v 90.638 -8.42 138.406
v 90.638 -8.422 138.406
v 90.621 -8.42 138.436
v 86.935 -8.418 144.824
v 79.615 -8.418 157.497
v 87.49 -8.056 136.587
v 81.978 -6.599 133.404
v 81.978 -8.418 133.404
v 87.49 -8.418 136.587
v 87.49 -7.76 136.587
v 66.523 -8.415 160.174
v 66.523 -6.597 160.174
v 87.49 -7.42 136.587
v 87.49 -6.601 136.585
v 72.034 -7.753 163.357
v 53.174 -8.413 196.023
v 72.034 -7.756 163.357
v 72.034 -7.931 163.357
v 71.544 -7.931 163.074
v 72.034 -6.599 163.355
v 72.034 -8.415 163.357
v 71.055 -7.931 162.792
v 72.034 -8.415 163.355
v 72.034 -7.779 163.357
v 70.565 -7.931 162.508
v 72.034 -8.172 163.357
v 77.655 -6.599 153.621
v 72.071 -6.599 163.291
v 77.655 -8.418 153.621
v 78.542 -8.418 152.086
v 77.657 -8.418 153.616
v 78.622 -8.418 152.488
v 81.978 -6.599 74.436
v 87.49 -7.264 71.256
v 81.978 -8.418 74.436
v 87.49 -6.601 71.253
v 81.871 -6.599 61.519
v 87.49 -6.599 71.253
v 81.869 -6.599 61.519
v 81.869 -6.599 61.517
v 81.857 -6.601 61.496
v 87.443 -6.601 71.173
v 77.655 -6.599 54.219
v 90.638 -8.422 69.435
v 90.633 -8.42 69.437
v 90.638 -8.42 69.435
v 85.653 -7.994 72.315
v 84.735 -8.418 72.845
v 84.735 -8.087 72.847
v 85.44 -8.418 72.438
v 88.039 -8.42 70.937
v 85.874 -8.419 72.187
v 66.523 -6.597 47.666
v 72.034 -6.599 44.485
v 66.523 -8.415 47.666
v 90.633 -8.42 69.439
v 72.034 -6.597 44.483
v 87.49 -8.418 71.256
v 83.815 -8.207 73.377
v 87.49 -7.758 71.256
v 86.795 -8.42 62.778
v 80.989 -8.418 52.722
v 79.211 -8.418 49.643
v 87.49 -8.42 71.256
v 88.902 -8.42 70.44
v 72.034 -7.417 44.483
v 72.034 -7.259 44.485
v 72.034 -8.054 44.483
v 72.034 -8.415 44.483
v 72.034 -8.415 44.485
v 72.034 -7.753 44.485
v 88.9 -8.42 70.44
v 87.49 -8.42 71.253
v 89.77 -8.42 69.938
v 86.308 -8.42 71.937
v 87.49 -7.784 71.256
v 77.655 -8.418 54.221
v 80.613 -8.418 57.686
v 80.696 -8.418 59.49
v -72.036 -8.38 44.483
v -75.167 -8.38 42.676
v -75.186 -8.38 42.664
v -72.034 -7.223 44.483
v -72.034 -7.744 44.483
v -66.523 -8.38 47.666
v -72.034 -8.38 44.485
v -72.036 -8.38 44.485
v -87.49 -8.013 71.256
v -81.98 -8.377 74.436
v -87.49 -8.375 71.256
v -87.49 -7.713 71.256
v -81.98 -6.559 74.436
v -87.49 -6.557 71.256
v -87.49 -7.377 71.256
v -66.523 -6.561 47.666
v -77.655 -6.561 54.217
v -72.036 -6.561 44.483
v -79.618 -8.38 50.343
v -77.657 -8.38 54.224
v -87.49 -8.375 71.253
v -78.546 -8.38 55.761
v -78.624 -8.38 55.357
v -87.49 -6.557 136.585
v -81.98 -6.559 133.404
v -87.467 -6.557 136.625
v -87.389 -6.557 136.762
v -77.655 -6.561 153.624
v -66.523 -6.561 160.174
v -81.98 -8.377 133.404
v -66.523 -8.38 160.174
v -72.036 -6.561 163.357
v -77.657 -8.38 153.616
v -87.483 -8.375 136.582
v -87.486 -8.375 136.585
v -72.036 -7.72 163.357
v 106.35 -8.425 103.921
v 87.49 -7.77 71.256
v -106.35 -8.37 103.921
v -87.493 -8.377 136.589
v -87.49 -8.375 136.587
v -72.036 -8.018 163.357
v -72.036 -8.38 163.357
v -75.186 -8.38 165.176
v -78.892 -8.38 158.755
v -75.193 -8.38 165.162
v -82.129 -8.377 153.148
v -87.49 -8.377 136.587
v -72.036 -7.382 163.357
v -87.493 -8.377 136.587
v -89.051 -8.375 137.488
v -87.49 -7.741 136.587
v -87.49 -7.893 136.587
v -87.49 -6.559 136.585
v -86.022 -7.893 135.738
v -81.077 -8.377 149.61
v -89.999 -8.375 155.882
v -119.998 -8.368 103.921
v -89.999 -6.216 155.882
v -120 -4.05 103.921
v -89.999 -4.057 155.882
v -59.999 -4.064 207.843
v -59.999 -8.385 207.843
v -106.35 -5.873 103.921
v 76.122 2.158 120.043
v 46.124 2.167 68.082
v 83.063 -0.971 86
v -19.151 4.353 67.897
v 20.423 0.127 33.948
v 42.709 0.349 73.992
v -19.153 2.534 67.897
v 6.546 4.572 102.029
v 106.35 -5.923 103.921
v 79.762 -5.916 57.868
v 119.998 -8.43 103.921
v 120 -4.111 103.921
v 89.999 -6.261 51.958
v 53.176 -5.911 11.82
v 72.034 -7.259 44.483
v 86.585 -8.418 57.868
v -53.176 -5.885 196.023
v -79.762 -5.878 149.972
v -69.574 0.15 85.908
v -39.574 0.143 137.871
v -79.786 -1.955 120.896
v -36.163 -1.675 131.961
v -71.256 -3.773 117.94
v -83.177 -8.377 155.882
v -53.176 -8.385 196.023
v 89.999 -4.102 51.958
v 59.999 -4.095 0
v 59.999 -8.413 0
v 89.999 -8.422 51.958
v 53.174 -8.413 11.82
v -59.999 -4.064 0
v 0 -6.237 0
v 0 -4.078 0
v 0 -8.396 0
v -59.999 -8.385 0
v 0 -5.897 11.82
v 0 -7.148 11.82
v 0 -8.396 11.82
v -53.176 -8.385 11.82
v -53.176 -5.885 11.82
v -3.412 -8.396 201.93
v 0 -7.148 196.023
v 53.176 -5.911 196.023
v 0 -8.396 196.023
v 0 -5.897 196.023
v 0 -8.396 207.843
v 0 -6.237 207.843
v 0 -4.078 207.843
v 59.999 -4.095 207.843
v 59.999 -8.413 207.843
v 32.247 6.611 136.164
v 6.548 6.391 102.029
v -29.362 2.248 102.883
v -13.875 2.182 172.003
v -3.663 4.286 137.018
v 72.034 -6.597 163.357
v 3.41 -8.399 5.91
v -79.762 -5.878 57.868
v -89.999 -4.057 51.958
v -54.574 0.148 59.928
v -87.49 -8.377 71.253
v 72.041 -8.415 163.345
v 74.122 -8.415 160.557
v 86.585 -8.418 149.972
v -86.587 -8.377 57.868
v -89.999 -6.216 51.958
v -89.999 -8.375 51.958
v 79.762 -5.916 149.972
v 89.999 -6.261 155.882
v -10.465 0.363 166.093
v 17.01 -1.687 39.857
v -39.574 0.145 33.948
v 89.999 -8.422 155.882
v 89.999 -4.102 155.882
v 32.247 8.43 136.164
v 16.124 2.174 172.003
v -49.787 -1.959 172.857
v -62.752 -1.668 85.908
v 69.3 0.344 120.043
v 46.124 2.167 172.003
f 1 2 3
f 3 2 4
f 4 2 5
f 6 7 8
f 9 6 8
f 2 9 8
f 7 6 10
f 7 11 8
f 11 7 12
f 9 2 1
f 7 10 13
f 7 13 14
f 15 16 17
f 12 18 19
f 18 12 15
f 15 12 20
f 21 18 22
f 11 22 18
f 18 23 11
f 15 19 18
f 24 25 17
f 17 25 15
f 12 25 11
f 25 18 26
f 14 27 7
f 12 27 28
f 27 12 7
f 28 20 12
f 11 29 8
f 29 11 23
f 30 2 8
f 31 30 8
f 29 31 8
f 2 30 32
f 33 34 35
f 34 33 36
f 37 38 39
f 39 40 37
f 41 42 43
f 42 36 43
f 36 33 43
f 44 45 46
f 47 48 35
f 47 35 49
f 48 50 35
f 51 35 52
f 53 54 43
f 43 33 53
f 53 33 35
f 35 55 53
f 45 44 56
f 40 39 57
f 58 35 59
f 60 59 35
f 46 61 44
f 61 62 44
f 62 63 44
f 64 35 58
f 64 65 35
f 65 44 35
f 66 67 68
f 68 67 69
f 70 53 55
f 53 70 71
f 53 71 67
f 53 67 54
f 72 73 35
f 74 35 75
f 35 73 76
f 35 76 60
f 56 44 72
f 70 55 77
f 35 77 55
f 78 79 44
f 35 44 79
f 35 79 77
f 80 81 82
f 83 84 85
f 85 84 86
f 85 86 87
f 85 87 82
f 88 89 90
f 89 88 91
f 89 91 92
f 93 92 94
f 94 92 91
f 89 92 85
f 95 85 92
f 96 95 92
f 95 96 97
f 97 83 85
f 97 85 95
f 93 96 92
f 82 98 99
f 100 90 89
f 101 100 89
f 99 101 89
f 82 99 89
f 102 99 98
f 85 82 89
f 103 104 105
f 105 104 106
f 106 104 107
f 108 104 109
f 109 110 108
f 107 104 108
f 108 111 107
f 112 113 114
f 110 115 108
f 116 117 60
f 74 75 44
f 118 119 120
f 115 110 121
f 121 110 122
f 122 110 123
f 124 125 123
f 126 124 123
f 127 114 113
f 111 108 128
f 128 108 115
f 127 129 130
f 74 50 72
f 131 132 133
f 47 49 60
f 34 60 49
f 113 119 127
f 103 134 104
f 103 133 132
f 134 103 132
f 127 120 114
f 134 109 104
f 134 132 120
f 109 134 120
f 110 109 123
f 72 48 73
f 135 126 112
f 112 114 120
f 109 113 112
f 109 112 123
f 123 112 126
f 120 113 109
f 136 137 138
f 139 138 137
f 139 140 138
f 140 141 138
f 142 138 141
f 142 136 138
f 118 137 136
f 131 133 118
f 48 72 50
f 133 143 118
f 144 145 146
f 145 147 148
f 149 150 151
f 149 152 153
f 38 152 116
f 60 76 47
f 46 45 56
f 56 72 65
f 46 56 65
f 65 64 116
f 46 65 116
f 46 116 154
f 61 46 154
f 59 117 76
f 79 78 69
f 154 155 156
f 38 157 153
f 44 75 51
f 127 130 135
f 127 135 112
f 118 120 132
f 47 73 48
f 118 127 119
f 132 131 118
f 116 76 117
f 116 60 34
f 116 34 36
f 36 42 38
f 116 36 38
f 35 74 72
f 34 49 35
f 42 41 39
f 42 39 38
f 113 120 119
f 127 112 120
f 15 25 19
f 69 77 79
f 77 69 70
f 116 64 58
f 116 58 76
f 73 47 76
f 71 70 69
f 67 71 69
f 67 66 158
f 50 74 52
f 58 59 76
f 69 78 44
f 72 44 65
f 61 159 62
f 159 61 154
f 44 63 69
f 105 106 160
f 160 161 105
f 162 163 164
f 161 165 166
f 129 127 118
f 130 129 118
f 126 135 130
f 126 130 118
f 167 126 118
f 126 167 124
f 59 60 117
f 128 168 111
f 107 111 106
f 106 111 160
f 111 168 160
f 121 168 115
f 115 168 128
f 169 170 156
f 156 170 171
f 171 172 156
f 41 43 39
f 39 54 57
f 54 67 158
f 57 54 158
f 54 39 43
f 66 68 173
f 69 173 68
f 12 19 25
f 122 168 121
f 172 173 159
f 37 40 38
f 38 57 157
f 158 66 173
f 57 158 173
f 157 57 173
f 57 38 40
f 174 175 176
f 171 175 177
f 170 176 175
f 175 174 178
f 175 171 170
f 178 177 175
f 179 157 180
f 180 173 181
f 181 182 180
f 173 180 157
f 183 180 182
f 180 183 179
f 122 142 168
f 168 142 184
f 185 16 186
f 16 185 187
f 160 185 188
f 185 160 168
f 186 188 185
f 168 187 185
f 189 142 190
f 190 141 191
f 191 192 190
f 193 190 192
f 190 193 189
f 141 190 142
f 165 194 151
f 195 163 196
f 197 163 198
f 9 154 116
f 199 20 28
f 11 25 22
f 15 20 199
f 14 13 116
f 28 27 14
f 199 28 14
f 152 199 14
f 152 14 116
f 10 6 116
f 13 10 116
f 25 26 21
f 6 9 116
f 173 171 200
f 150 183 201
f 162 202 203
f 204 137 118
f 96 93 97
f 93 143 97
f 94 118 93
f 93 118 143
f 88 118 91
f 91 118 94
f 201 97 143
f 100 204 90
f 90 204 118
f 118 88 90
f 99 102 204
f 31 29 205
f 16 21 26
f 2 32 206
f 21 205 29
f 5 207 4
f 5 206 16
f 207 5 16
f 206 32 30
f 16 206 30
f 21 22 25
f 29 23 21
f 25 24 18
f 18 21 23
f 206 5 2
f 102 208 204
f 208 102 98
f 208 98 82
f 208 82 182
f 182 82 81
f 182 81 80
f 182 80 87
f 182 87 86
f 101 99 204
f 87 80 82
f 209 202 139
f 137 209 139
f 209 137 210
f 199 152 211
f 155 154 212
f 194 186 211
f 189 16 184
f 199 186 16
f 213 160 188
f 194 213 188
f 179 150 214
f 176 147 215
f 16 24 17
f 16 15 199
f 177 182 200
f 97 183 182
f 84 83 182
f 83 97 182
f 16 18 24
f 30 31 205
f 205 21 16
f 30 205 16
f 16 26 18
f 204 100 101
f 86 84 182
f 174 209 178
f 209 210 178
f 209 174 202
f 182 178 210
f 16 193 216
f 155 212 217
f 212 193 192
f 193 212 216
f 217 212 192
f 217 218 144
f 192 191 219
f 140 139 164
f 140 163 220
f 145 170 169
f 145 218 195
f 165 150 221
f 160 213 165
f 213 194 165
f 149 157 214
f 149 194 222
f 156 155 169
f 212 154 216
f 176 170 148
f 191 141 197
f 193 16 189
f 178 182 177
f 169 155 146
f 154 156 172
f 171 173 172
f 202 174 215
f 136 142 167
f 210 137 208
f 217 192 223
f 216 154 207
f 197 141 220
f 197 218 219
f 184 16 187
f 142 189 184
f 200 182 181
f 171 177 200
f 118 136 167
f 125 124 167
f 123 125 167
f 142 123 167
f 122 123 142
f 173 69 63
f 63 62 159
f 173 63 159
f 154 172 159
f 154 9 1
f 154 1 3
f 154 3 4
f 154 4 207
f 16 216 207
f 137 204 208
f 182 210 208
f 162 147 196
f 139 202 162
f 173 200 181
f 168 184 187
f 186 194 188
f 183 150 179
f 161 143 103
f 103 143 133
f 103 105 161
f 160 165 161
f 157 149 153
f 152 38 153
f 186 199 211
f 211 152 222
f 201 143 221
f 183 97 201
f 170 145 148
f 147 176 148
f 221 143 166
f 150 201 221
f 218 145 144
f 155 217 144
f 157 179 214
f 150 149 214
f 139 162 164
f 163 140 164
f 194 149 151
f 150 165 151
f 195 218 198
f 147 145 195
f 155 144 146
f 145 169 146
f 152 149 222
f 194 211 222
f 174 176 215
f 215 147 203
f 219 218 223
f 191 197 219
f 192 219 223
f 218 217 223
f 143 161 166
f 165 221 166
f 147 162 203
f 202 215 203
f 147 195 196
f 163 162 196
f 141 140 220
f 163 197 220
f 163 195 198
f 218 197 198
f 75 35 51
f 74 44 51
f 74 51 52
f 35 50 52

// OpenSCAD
/*
    Hexagon-Rev-v41-standalone.scad
    --------------------------------
    Standalone OpenSCAD reconstruction of the uploaded Hexagon-Rev.stl.

    IMPORTANT
    ---------
    - No external STL import is required.
    - Geometry below is embedded directly as a polyhedron.
    - The uploaded model's shape and mounting geometry are preserved.
    - Resizing is UNIFORM so proportions do not change.

    Source measured dimensions
    --------------------------
    X width  : 202.972012 mm
    Y depth  : 14.257996 mm
    Z height : 175.776001 mm

    Default target width
    --------------------
    240.0 mm  = 9.4488 in

    To resize:
        change target_width_mm only.

    Export:
        F6 Render
        File -> Export -> Export as STL
*/


// =============================================================================
// USER PARAMETERS
// =============================================================================

target_width_mm = 240.0;

// Optional final translation after scaling.
translate_x_mm = 0.0;
translate_y_mm = 0.0;
translate_z_mm = 0.0;


// =============================================================================
// SOURCE DIMENSIONS
// =============================================================================

source_width_mm  = 202.972012;
source_depth_mm  = 14.257996;
source_height_mm = 175.776001;

uniform_scale =
    target_width_mm / source_width_mm;


// =============================================================================
// DIAGNOSTICS
// =============================================================================

echo("====================================================");
echo("HEXAGON REV v41 STANDALONE");
echo("====================================================");

echo(str("source width             : ", source_width_mm, " mm"));
echo(str("source depth             : ", source_depth_mm, " mm"));
echo(str("source height            : ", source_height_mm, " mm"));

echo(str("target width             : ", target_width_mm, " mm"));
echo(str("uniform scale            : ", uniform_scale));

echo(str("scaled depth             : ",
         source_depth_mm * uniform_scale, " mm"));

echo(str("scaled height            : ",
         source_height_mm * uniform_scale, " mm"));

echo("====================================================");


// =============================================================================
// VALIDATION
// =============================================================================

assert(
    target_width_mm > 0,
    "target_width_mm must be greater than zero."
);


// =============================================================================
// EMBEDDED ORIGINAL GEOMETRY
// =============================================================================

source_points = [
        [76.639997, -7.121002, 117.078003],
        [76.654005, -7.123001, 117.052002],
        [76.654005, -7.121002, 117.052002],
        [73.522001, -7.119003, 122.480003],
        [67.331999, -7.119003, 133.198013],
        [69.33, -7.119003, 112.822006],
        [69.33, -5.580994, 112.822006],
        [73.992002, -6.813004, 115.514008],
        [73.992002, -7.119003, 115.514008],
        [73.992002, -6.563004, 115.514008],
        [56.259993, -7.117004, 135.462006],
        [56.259993, -5.578995, 135.462006],
        [73.992002, -6.274994, 115.514008],
        [73.992002, -5.582993, 115.512009],
        [60.919996, -6.559006, 138.154007],
        [44.969999, -7.115005, 165.780014],
        [60.919996, -6.556992, 138.154007],
        [60.505995, -6.707001, 137.914001],
        [60.919996, -6.707001, 138.154007],
        [60.919996, -5.580994, 138.152008],
        [60.091993, -6.707001, 137.67601],
        [60.919996, -7.117004, 138.154007],
        [60.919996, -7.117004, 138.152008],
        [59.677992, -6.707001, 137.436005],
        [60.919996, -6.578995, 138.154007],
        [60.919996, -6.910995, 138.154007],
        [65.673994, -5.580994, 129.920013],
        [60.951994, -5.580994, 138.098007],
        [65.673994, -7.119003, 129.920013],
        [66.423994, -7.119003, 128.622009],
        [65.675993, -7.119003, 129.916],
        [66.492002, -7.119003, 128.962006],
        [69.33, -7.119003, 62.952003],
        [73.992002, -6.143005, 60.262001],
        [69.33, -5.580994, 62.952003],
        [73.992002, -5.582993, 60.260002],
        [69.238005, -5.580994, 52.028004],
        [73.992002, -5.580994, 60.260002],
        [69.240004, -5.580994, 52.028004],
        [69.238005, -5.580994, 52.026001],
        [65.673994, -5.580994, 45.854004],
        [73.951994, -5.582993, 60.192001],
        [69.227995, -5.582993, 52.008003],
        [76.654005, -7.121002, 58.722004],
        [76.649992, -7.121002, 58.724003],
        [76.654005, -7.123001, 58.722004],
        [71.662001, -7.119003, 61.606003],
        [72.438002, -6.761002, 61.158005],
        [71.662001, -6.839005, 61.608002],
        [72.257994, -7.119003, 61.262001],
        [72.624998, -7.119995, 61.050003],
        [74.455992, -7.121002, 59.993004],
        [60.919996, -5.580994, 37.622002],
        [56.259993, -5.578995, 40.312],
        [56.259993, -7.117004, 40.312],
        [76.649992, -7.121002, 58.726002],
        [60.919996, -5.578995, 37.620003],
        [70.884001, -6.940994, 62.056004],
        [73.992002, -7.119003, 60.262001],
        [73.992002, -6.561005, 60.262001],
        [73.404005, -7.121002, 53.092003],
        [68.494001, -7.119003, 44.588001],
        [66.990004, -7.119003, 41.984001],
        [73.992002, -7.121002, 60.262001],
        [75.186003, -7.121002, 59.572002],
        [60.919996, -6.811005, 37.620003],
        [60.919996, -6.138992, 37.622002],
        [60.919996, -6.272995, 37.620003],
        [60.919996, -7.117004, 37.620003],
        [60.919996, -7.117004, 37.622002],
        [60.919996, -6.556992, 37.622002],
        [73.992002, -7.121002, 60.260002],
        [75.184004, -7.121002, 59.572002],
        [72.992002, -7.121002, 60.838001],
        [75.919996, -7.121002, 59.148003],
        [73.992002, -6.582993, 60.262001],
        [65.673994, -7.119003, 45.856003],
        [68.246, -7.119003, 50.312004],
        [68.175993, -7.119003, 48.786003],
        [-63.586, -7.087006, 36.082001],
        [-63.570009, -7.087006, 36.092003],
        [-60.922007, -7.087006, 37.620003],
        [-56.260004, -7.087006, 40.312],
        [-60.92, -6.548996, 37.620003],
        [-60.92, -6.108994, 37.620003],
        [-60.92, -7.087006, 37.622002],
        [-60.922007, -7.087006, 37.622002],
        [-73.992006, -7.082993, 60.262001],
        [-69.332003, -7.084991, 62.952003],
        [-73.992006, -6.776993, 60.262001],
        [-73.992006, -6.522995, 60.262001],
        [-69.332003, -5.546997, 62.952003],
        [-73.992006, -6.238998, 60.262001],
        [-73.992006, -5.544998, 60.262001],
        [-56.260004, -5.548996, 40.312],
        [-65.674006, -5.548996, 45.852001],
        [-60.922007, -5.548996, 37.620003],
        [-65.676004, -7.087006, 45.858002],
        [-67.334002, -7.087006, 42.576],
        [-73.992006, -7.082993, 60.260002],
        [-66.428003, -7.087006, 47.158001],
        [-66.494005, -7.087006, 46.816002],
        [-73.972002, -5.544998, 115.546005],
        [-69.332003, -5.546997, 112.822006],
        [-73.992006, -5.544998, 115.512009],
        [-73.906008, -5.544998, 115.662003],
        [-65.674006, -5.548996, 129.922012],
        [-69.332003, -7.084991, 112.822006],
        [-56.260004, -5.548996, 135.462006],
        [-56.260004, -7.087006, 135.462006],
        [-60.922007, -5.548996, 138.154007],
        [-73.988008, -7.082993, 115.512009],
        [-73.98601, -7.082993, 115.510002],
        [-65.676004, -7.087006, 129.916],
        [-60.922007, -6.528992, 138.154007],
        [73.992002, -6.570999, 60.262001],
        [89.941999, -7.125, 87.888],
        [-73.992006, -7.082993, 115.514008],
        [-73.994005, -7.084991, 115.516006],
        [-89.942007, -7.078995, 87.888],
        [-60.922007, -6.781006, 138.154007],
        [-60.922007, -7.087006, 138.154007],
        [-63.586, -7.087006, 139.692001],
        [-63.592005, -7.087006, 139.680008],
        [-66.720003, -7.087006, 134.262009],
        [-69.45801, -7.084991, 129.520004],
        [-73.992006, -7.084991, 115.514008],
        [-60.922007, -6.242996, 138.154007],
        [-75.312006, -7.082993, 116.276009],
        [-73.994005, -7.084991, 115.514008],
        [-73.992006, -5.546997, 115.512009],
        [-73.992006, -6.675003, 115.514008],
        [-73.992006, -6.546997, 115.514008],
        [-72.750002, -6.675003, 114.796005],
        [-68.56801, -7.084991, 126.528008],
        [-76.114008, -5.257004, 131.832001],
        [-101.484007, -7.076996, 87.888],
        [-76.114008, -7.082993, 131.832001],
        [-101.486006, -3.425003, 87.888],
        [-76.114008, -3.431, 131.832001],
        [-50.742006, -3.436996, 175.776001],
        [-50.742006, -7.091003, 175.776001],
        [-89.942007, -4.966995, 87.888],
        [70.247999, -0.820999, 72.732002],
        [39.007994, 1.833008, 57.578003],
        [64.378004, 1.824997, 101.522003],
        [17.272001, 0.106995, 28.710001],
        [-16.196001, 3.681, 57.422001],
        [5.535994, 3.867004, 86.288002],
        [-16.198, 2.143005, 57.422001],
        [36.119993, 0.294998, 62.576004],
        [67.455992, -5.003006, 48.940002],
        [89.941999, -5.009003, 87.888],
        [101.483992, -7.128998, 87.888],
        [76.113997, -5.294998, 43.942001],
        [101.486006, -3.477005, 87.888],
        [44.971998, -4.998993, 9.996],
        [60.919996, -6.138992, 37.620003],
        [73.225996, -7.119003, 48.940002],
        [-44.972002, -4.977005, 165.780014],
        [-67.456011, -4.970993, 126.834007],
        [-67.476, -1.653, 102.244003],
        [-33.468004, 0.121002, 116.600006],
        [-58.840006, 0.126999, 72.654007],
        [-60.262011, -3.190994, 99.744003],
        [-30.584002, -1.416992, 111.602005],
        [-70.344004, -7.084991, 131.832001],
        [-44.972002, -7.091003, 165.780014],
        [50.742002, -3.462997, 0],
        [76.113997, -3.468994, 43.942001],
        [50.742002, -7.115005, 0],
        [76.113997, -7.123001, 43.942001],
        [44.969999, -7.115005, 9.996],
        [-0.000002, -3.449005, 0],
        [-0.000002, -5.274994, 0],
        [-50.742006, -3.436996, 0],
        [-0.000002, -7.100998, 0],
        [-50.742006, -7.091003, 0],
        [-0.000002, -6.044998, 9.996],
        [-0.000002, -4.987, 9.996],
        [-0.000002, -7.100998, 9.996],
        [-44.972002, -7.091003, 9.996],
        [-44.972002, -4.977005, 9.996],
        [-2.886003, -7.100998, 170.776001],
        [44.971998, -4.998993, 165.780014],
        [-0.000002, -6.044998, 165.780014],
        [-0.000002, -7.100998, 165.780014],
        [-0.000002, -4.987, 165.780014],
        [-0.000002, -5.274994, 175.776001],
        [-0.000002, -7.100998, 175.776001],
        [-0.000002, -3.449005, 175.776001],
        [50.742002, -3.462997, 175.776001],
        [50.742002, -7.115005, 175.776001],
        [27.272001, 5.591003, 115.156006],
        [-24.832003, 1.901001, 87.010002],
        [5.537992, 5.404999, 86.288002],
        [-3.098009, 3.625, 115.878006],
        [-11.733995, 1.845001, 145.466003],
        [60.919996, -5.578995, 138.154007],
        [2.884001, -7.102997, 4.998],
        [-67.456011, -4.970993, 48.940002],
        [-46.154009, 0.125, 50.682003],
        [-76.114008, -3.431, 43.942001],
        [-73.992006, -7.084991, 60.260002],
        [60.925993, -7.117004, 138.144012],
        [62.686003, -7.117004, 135.786011],
        [73.225996, -7.119003, 126.834007],
        [-73.228006, -7.084991, 48.940002],
        [-76.114008, -5.257004, 43.942001],
        [-76.114008, -7.082993, 43.942001],
        [67.455992, -5.003006, 126.834007],
        [76.113997, -5.294998, 131.832001],
        [-8.850008, 0.307007, 140.468002],
        [14.386, -1.427002, 33.708],
        [-33.468004, 0.123001, 28.710001],
        [76.113997, -7.123001, 131.832001],
        [76.113997, -3.468994, 131.832001],
        [27.272001, 7.128998, 115.156006],
        [13.636, 1.839005, 145.466003],
        [-42.106005, -1.656998, 146.188004],
        [-53.070009, -1.410995, 72.654007],
        [58.608, 0.291, 101.522003],
        [39.007994, 1.833008, 145.466003]
];

source_faces = [
        [0, 1, 2],
        [3, 1, 0],
        [4, 1, 3],
        [5, 6, 7],
        [5, 7, 8],
        [5, 8, 1],
        [9, 7, 6],
        [5, 10, 6],
        [11, 6, 10],
        [2, 1, 8],
        [12, 9, 6],
        [13, 12, 6],
        [14, 15, 16],
        [17, 18, 11],
        [16, 11, 18],
        [19, 11, 16],
        [20, 18, 21],
        [18, 20, 10],
        [10, 22, 18],
        [18, 17, 16],
        [14, 23, 24],
        [16, 23, 14],
        [10, 23, 11],
        [25, 18, 23],
        [6, 26, 13],
        [27, 26, 11],
        [6, 11, 26],
        [11, 19, 27],
        [5, 28, 10],
        [22, 10, 28],
        [5, 1, 29],
        [5, 29, 30],
        [5, 30, 28],
        [31, 29, 1],
        [32, 33, 34],
        [35, 34, 33],
        [36, 37, 38],
        [38, 39, 36],
        [40, 41, 42],
        [40, 35, 41],
        [40, 34, 35],
        [43, 44, 45],
        [32, 46, 47],
        [48, 32, 47],
        [32, 49, 46],
        [50, 32, 51],
        [40, 52, 53],
        [53, 34, 40],
        [32, 34, 53],
        [53, 54, 32],
        [55, 45, 44],
        [56, 36, 39],
        [57, 32, 58],
        [32, 57, 59],
        [45, 60, 43],
        [45, 61, 60],
        [45, 62, 61],
        [58, 32, 63],
        [32, 64, 63],
        [32, 45, 64],
        [65, 66, 67],
        [68, 66, 65],
        [54, 53, 69],
        [70, 69, 53],
        [66, 70, 53],
        [52, 66, 53],
        [32, 71, 72],
        [73, 32, 74],
        [75, 71, 32],
        [59, 75, 32],
        [72, 45, 55],
        [76, 54, 69],
        [54, 76, 32],
        [45, 77, 78],
        [77, 45, 32],
        [76, 77, 32],
        [79, 80, 81],
        [82, 83, 84],
        [85, 83, 82],
        [86, 85, 82],
        [79, 86, 82],
        [87, 88, 89],
        [90, 89, 88],
        [91, 90, 88],
        [92, 91, 93],
        [90, 91, 92],
        [82, 91, 88],
        [91, 82, 94],
        [91, 94, 95],
        [96, 95, 94],
        [82, 84, 96],
        [94, 82, 96],
        [91, 95, 93],
        [97, 98, 79],
        [88, 87, 99],
        [88, 99, 100],
        [88, 100, 97],
        [88, 97, 79],
        [98, 97, 101],
        [88, 79, 82],
        [102, 103, 104],
        [105, 103, 102],
        [106, 103, 105],
        [107, 103, 108],
        [108, 109, 107],
        [108, 103, 106],
        [106, 110, 108],
        [111, 112, 113],
        [108, 114, 109],
        [59, 115, 116],
        [45, 73, 74],
        [117, 118, 119],
        [120, 109, 114],
        [121, 109, 120],
        [122, 109, 121],
        [122, 123, 124],
        [122, 124, 125],
        [112, 111, 126],
        [127, 108, 110],
        [114, 108, 127],
        [128, 129, 126],
        [72, 49, 74],
        [130, 131, 132],
        [59, 48, 47],
        [48, 59, 33],
        [126, 118, 112],
        [103, 133, 104],
        [131, 130, 104],
        [131, 104, 133],
        [111, 117, 126],
        [103, 107, 133],
        [117, 131, 133],
        [117, 133, 107],
        [122, 107, 109],
        [71, 46, 72],
        [113, 125, 134],
        [117, 111, 113],
        [113, 112, 107],
        [122, 113, 107],
        [125, 113, 122],
        [107, 112, 117],
        [135, 136, 137],
        [136, 135, 138],
        [135, 139, 138],
        [135, 140, 139],
        [140, 135, 141],
        [135, 137, 141],
        [137, 136, 119],
        [119, 130, 132],
        [49, 72, 46],
        [119, 142, 130],
        [143, 144, 145],
        [146, 147, 144],
        [148, 149, 150],
        [151, 152, 150],
        [116, 152, 37],
        [47, 75, 59],
        [55, 44, 43],
        [64, 72, 55],
        [64, 55, 43],
        [116, 63, 64],
        [116, 64, 43],
        [153, 116, 43],
        [153, 43, 60],
        [75, 115, 57],
        [68, 78, 77],
        [154, 155, 153],
        [151, 156, 37],
        [51, 73, 45],
        [134, 128, 126],
        [113, 134, 126],
        [131, 117, 119],
        [46, 71, 47],
        [118, 126, 119],
        [119, 132, 131],
        [115, 75, 116],
        [33, 59, 116],
        [35, 33, 116],
        [37, 41, 35],
        [37, 35, 116],
        [72, 74, 32],
        [32, 48, 33],
        [36, 42, 41],
        [37, 36, 41],
        [118, 117, 112],
        [117, 113, 126],
        [17, 23, 16],
        [77, 76, 68],
        [69, 68, 76],
        [58, 63, 116],
        [75, 58, 116],
        [75, 47, 71],
        [68, 69, 70],
        [68, 70, 66],
        [157, 67, 66],
        [50, 74, 49],
        [75, 57, 58],
        [45, 78, 68],
        [64, 45, 72],
        [61, 158, 60],
        [153, 60, 158],
        [68, 62, 45],
        [159, 105, 102],
        [102, 160, 159],
        [161, 162, 163],
        [164, 165, 160],
        [119, 126, 129],
        [119, 129, 128],
        [128, 134, 125],
        [119, 128, 125],
        [119, 125, 166],
        [124, 166, 125],
        [115, 59, 57],
        [110, 167, 127],
        [105, 110, 106],
        [159, 110, 105],
        [159, 167, 110],
        [114, 167, 120],
        [127, 167, 114],
        [154, 168, 169],
        [170, 168, 154],
        [154, 171, 170],
        [36, 40, 42],
        [56, 52, 36],
        [157, 66, 52],
        [157, 52, 56],
        [40, 36, 52],
        [172, 65, 67],
        [65, 172, 68],
        [23, 17, 11],
        [120, 167, 121],
        [158, 172, 171],
        [37, 39, 38],
        [156, 56, 37],
        [172, 67, 157],
        [172, 157, 56],
        [172, 56, 156],
        [39, 37, 56],
        [173, 174, 175],
        [176, 174, 170],
        [174, 173, 168],
        [177, 175, 174],
        [168, 170, 174],
        [174, 176, 177],
        [178, 156, 179],
        [180, 172, 178],
        [178, 181, 180],
        [156, 178, 172],
        [181, 178, 182],
        [179, 182, 178],
        [167, 141, 121],
        [183, 141, 167],
        [184, 15, 185],
        [186, 185, 15],
        [187, 185, 159],
        [167, 159, 185],
        [185, 187, 184],
        [185, 186, 167],
        [188, 141, 189],
        [190, 140, 188],
        [188, 191, 190],
        [191, 188, 192],
        [189, 192, 188],
        [141, 188, 140],
        [148, 193, 165],
        [194, 162, 195],
        [196, 162, 197],
        [116, 153, 8],
        [27, 19, 198],
        [20, 23, 10],
        [198, 19, 16],
        [116, 12, 13],
        [13, 26, 27],
        [13, 27, 198],
        [13, 198, 152],
        [116, 13, 152],
        [116, 7, 9],
        [116, 9, 12],
        [21, 25, 23],
        [116, 8, 7],
        [199, 170, 172],
        [200, 182, 149],
        [201, 202, 163],
        [119, 136, 203],
        [96, 93, 95],
        [96, 142, 93],
        [93, 119, 92],
        [142, 119, 93],
        [90, 119, 89],
        [92, 119, 90],
        [142, 96, 200],
        [87, 203, 99],
        [119, 203, 87],
        [87, 89, 119],
        [203, 101, 97],
        [204, 28, 30],
        [25, 21, 15],
        [205, 31, 1],
        [28, 204, 21],
        [3, 206, 4],
        [15, 205, 4],
        [15, 4, 206],
        [29, 31, 205],
        [29, 205, 15],
        [23, 20, 21],
        [21, 22, 28],
        [18, 24, 23],
        [22, 21, 18],
        [1, 4, 205],
        [203, 207, 101],
        [98, 101, 207],
        [79, 98, 207],
        [181, 79, 207],
        [80, 79, 181],
        [81, 80, 181],
        [86, 81, 181],
        [85, 86, 181],
        [203, 97, 100],
        [79, 81, 86],
        [138, 202, 208],
        [138, 208, 136],
        [209, 136, 208],
        [210, 152, 198],
        [211, 153, 155],
        [210, 184, 193],
        [183, 15, 189],
        [15, 184, 198],
        [187, 159, 212],
        [187, 212, 193],
        [213, 149, 179],
        [214, 147, 173],
        [14, 24, 15],
        [198, 16, 15],
        [199, 181, 176],
        [181, 182, 96],
        [181, 84, 83],
        [181, 96, 84],
        [24, 18, 15],
        [204, 30, 29],
        [15, 21, 204],
        [15, 204, 29],
        [18, 25, 15],
        [100, 99, 203],
        [181, 83, 85],
        [177, 208, 175],
        [177, 209, 208],
        [202, 175, 208],
        [209, 177, 181],
        [215, 192, 15],
        [216, 211, 155],
        [191, 192, 211],
        [215, 211, 192],
        [191, 211, 216],
        [145, 217, 216],
        [218, 190, 191],
        [161, 138, 139],
        [219, 162, 139],
        [169, 168, 144],
        [195, 217, 144],
        [220, 149, 165],
        [165, 212, 159],
        [165, 193, 212],
        [213, 156, 150],
        [221, 193, 150],
        [169, 155, 154],
        [215, 153, 211],
        [146, 168, 173],
        [197, 140, 190],
        [189, 15, 192],
        [176, 181, 177],
        [143, 155, 169],
        [171, 154, 153],
        [171, 172, 170],
        [214, 175, 202],
        [166, 141, 137],
        [207, 136, 209],
        [222, 191, 216],
        [206, 153, 215],
        [219, 140, 197],
        [218, 217, 197],
        [186, 15, 183],
        [183, 189, 141],
        [180, 181, 199],
        [199, 176, 170],
        [166, 137, 119],
        [166, 124, 123],
        [166, 123, 122],
        [166, 122, 141],
        [141, 122, 121],
        [62, 68, 172],
        [158, 61, 62],
        [158, 62, 172],
        [158, 171, 153],
        [2, 8, 153],
        [0, 2, 153],
        [3, 0, 153],
        [206, 3, 153],
        [206, 215, 15],
        [207, 203, 136],
        [207, 209, 181],
        [194, 147, 163],
        [163, 202, 138],
        [180, 199, 172],
        [186, 183, 167],
        [187, 193, 184],
        [179, 149, 182],
        [104, 142, 160],
        [130, 142, 104],
        [160, 102, 104],
        [160, 165, 159],
        [151, 150, 156],
        [151, 37, 152],
        [210, 198, 184],
        [221, 152, 210],
        [220, 142, 200],
        [200, 96, 182],
        [146, 144, 168],
        [146, 173, 147],
        [164, 142, 220],
        [220, 200, 149],
        [145, 144, 217],
        [145, 216, 155],
        [213, 179, 156],
        [213, 150, 149],
        [161, 163, 138],
        [161, 139, 162],
        [148, 150, 193],
        [148, 165, 149],
        [196, 217, 195],
        [195, 144, 147],
        [143, 145, 155],
        [143, 169, 144],
        [221, 150, 152],
        [221, 210, 193],
        [214, 173, 175],
        [201, 147, 214],
        [222, 217, 218],
        [218, 197, 190],
        [222, 218, 191],
        [222, 216, 217],
        [164, 160, 142],
        [164, 220, 165],
        [201, 163, 147],
        [201, 214, 202],
        [194, 195, 147],
        [194, 163, 162],
        [219, 139, 140],
        [219, 197, 162],
        [196, 195, 162],
        [196, 197, 217],
        [51, 32, 73],
        [51, 45, 74],
        [50, 51, 74],
        [50, 49, 32]
];


// =============================================================================
// SOURCE MODEL
// =============================================================================

module source_hexagon_rev() {

    polyhedron(
        points = source_points,
        faces = source_faces,
        convexity = 20
    );
}


// =============================================================================
// SCALED MODEL
// =============================================================================

module scaled_hexagon_rev() {

    translate(
        [
            translate_x_mm,
            translate_y_mm,
            translate_z_mm
        ]
    )

    scale(
        [
            uniform_scale,
            uniform_scale,
            uniform_scale
        ]
    )

        source_hexagon_rev();
}


// =============================================================================
// OUTPUT
// =============================================================================

scaled_hexagon_rev();
